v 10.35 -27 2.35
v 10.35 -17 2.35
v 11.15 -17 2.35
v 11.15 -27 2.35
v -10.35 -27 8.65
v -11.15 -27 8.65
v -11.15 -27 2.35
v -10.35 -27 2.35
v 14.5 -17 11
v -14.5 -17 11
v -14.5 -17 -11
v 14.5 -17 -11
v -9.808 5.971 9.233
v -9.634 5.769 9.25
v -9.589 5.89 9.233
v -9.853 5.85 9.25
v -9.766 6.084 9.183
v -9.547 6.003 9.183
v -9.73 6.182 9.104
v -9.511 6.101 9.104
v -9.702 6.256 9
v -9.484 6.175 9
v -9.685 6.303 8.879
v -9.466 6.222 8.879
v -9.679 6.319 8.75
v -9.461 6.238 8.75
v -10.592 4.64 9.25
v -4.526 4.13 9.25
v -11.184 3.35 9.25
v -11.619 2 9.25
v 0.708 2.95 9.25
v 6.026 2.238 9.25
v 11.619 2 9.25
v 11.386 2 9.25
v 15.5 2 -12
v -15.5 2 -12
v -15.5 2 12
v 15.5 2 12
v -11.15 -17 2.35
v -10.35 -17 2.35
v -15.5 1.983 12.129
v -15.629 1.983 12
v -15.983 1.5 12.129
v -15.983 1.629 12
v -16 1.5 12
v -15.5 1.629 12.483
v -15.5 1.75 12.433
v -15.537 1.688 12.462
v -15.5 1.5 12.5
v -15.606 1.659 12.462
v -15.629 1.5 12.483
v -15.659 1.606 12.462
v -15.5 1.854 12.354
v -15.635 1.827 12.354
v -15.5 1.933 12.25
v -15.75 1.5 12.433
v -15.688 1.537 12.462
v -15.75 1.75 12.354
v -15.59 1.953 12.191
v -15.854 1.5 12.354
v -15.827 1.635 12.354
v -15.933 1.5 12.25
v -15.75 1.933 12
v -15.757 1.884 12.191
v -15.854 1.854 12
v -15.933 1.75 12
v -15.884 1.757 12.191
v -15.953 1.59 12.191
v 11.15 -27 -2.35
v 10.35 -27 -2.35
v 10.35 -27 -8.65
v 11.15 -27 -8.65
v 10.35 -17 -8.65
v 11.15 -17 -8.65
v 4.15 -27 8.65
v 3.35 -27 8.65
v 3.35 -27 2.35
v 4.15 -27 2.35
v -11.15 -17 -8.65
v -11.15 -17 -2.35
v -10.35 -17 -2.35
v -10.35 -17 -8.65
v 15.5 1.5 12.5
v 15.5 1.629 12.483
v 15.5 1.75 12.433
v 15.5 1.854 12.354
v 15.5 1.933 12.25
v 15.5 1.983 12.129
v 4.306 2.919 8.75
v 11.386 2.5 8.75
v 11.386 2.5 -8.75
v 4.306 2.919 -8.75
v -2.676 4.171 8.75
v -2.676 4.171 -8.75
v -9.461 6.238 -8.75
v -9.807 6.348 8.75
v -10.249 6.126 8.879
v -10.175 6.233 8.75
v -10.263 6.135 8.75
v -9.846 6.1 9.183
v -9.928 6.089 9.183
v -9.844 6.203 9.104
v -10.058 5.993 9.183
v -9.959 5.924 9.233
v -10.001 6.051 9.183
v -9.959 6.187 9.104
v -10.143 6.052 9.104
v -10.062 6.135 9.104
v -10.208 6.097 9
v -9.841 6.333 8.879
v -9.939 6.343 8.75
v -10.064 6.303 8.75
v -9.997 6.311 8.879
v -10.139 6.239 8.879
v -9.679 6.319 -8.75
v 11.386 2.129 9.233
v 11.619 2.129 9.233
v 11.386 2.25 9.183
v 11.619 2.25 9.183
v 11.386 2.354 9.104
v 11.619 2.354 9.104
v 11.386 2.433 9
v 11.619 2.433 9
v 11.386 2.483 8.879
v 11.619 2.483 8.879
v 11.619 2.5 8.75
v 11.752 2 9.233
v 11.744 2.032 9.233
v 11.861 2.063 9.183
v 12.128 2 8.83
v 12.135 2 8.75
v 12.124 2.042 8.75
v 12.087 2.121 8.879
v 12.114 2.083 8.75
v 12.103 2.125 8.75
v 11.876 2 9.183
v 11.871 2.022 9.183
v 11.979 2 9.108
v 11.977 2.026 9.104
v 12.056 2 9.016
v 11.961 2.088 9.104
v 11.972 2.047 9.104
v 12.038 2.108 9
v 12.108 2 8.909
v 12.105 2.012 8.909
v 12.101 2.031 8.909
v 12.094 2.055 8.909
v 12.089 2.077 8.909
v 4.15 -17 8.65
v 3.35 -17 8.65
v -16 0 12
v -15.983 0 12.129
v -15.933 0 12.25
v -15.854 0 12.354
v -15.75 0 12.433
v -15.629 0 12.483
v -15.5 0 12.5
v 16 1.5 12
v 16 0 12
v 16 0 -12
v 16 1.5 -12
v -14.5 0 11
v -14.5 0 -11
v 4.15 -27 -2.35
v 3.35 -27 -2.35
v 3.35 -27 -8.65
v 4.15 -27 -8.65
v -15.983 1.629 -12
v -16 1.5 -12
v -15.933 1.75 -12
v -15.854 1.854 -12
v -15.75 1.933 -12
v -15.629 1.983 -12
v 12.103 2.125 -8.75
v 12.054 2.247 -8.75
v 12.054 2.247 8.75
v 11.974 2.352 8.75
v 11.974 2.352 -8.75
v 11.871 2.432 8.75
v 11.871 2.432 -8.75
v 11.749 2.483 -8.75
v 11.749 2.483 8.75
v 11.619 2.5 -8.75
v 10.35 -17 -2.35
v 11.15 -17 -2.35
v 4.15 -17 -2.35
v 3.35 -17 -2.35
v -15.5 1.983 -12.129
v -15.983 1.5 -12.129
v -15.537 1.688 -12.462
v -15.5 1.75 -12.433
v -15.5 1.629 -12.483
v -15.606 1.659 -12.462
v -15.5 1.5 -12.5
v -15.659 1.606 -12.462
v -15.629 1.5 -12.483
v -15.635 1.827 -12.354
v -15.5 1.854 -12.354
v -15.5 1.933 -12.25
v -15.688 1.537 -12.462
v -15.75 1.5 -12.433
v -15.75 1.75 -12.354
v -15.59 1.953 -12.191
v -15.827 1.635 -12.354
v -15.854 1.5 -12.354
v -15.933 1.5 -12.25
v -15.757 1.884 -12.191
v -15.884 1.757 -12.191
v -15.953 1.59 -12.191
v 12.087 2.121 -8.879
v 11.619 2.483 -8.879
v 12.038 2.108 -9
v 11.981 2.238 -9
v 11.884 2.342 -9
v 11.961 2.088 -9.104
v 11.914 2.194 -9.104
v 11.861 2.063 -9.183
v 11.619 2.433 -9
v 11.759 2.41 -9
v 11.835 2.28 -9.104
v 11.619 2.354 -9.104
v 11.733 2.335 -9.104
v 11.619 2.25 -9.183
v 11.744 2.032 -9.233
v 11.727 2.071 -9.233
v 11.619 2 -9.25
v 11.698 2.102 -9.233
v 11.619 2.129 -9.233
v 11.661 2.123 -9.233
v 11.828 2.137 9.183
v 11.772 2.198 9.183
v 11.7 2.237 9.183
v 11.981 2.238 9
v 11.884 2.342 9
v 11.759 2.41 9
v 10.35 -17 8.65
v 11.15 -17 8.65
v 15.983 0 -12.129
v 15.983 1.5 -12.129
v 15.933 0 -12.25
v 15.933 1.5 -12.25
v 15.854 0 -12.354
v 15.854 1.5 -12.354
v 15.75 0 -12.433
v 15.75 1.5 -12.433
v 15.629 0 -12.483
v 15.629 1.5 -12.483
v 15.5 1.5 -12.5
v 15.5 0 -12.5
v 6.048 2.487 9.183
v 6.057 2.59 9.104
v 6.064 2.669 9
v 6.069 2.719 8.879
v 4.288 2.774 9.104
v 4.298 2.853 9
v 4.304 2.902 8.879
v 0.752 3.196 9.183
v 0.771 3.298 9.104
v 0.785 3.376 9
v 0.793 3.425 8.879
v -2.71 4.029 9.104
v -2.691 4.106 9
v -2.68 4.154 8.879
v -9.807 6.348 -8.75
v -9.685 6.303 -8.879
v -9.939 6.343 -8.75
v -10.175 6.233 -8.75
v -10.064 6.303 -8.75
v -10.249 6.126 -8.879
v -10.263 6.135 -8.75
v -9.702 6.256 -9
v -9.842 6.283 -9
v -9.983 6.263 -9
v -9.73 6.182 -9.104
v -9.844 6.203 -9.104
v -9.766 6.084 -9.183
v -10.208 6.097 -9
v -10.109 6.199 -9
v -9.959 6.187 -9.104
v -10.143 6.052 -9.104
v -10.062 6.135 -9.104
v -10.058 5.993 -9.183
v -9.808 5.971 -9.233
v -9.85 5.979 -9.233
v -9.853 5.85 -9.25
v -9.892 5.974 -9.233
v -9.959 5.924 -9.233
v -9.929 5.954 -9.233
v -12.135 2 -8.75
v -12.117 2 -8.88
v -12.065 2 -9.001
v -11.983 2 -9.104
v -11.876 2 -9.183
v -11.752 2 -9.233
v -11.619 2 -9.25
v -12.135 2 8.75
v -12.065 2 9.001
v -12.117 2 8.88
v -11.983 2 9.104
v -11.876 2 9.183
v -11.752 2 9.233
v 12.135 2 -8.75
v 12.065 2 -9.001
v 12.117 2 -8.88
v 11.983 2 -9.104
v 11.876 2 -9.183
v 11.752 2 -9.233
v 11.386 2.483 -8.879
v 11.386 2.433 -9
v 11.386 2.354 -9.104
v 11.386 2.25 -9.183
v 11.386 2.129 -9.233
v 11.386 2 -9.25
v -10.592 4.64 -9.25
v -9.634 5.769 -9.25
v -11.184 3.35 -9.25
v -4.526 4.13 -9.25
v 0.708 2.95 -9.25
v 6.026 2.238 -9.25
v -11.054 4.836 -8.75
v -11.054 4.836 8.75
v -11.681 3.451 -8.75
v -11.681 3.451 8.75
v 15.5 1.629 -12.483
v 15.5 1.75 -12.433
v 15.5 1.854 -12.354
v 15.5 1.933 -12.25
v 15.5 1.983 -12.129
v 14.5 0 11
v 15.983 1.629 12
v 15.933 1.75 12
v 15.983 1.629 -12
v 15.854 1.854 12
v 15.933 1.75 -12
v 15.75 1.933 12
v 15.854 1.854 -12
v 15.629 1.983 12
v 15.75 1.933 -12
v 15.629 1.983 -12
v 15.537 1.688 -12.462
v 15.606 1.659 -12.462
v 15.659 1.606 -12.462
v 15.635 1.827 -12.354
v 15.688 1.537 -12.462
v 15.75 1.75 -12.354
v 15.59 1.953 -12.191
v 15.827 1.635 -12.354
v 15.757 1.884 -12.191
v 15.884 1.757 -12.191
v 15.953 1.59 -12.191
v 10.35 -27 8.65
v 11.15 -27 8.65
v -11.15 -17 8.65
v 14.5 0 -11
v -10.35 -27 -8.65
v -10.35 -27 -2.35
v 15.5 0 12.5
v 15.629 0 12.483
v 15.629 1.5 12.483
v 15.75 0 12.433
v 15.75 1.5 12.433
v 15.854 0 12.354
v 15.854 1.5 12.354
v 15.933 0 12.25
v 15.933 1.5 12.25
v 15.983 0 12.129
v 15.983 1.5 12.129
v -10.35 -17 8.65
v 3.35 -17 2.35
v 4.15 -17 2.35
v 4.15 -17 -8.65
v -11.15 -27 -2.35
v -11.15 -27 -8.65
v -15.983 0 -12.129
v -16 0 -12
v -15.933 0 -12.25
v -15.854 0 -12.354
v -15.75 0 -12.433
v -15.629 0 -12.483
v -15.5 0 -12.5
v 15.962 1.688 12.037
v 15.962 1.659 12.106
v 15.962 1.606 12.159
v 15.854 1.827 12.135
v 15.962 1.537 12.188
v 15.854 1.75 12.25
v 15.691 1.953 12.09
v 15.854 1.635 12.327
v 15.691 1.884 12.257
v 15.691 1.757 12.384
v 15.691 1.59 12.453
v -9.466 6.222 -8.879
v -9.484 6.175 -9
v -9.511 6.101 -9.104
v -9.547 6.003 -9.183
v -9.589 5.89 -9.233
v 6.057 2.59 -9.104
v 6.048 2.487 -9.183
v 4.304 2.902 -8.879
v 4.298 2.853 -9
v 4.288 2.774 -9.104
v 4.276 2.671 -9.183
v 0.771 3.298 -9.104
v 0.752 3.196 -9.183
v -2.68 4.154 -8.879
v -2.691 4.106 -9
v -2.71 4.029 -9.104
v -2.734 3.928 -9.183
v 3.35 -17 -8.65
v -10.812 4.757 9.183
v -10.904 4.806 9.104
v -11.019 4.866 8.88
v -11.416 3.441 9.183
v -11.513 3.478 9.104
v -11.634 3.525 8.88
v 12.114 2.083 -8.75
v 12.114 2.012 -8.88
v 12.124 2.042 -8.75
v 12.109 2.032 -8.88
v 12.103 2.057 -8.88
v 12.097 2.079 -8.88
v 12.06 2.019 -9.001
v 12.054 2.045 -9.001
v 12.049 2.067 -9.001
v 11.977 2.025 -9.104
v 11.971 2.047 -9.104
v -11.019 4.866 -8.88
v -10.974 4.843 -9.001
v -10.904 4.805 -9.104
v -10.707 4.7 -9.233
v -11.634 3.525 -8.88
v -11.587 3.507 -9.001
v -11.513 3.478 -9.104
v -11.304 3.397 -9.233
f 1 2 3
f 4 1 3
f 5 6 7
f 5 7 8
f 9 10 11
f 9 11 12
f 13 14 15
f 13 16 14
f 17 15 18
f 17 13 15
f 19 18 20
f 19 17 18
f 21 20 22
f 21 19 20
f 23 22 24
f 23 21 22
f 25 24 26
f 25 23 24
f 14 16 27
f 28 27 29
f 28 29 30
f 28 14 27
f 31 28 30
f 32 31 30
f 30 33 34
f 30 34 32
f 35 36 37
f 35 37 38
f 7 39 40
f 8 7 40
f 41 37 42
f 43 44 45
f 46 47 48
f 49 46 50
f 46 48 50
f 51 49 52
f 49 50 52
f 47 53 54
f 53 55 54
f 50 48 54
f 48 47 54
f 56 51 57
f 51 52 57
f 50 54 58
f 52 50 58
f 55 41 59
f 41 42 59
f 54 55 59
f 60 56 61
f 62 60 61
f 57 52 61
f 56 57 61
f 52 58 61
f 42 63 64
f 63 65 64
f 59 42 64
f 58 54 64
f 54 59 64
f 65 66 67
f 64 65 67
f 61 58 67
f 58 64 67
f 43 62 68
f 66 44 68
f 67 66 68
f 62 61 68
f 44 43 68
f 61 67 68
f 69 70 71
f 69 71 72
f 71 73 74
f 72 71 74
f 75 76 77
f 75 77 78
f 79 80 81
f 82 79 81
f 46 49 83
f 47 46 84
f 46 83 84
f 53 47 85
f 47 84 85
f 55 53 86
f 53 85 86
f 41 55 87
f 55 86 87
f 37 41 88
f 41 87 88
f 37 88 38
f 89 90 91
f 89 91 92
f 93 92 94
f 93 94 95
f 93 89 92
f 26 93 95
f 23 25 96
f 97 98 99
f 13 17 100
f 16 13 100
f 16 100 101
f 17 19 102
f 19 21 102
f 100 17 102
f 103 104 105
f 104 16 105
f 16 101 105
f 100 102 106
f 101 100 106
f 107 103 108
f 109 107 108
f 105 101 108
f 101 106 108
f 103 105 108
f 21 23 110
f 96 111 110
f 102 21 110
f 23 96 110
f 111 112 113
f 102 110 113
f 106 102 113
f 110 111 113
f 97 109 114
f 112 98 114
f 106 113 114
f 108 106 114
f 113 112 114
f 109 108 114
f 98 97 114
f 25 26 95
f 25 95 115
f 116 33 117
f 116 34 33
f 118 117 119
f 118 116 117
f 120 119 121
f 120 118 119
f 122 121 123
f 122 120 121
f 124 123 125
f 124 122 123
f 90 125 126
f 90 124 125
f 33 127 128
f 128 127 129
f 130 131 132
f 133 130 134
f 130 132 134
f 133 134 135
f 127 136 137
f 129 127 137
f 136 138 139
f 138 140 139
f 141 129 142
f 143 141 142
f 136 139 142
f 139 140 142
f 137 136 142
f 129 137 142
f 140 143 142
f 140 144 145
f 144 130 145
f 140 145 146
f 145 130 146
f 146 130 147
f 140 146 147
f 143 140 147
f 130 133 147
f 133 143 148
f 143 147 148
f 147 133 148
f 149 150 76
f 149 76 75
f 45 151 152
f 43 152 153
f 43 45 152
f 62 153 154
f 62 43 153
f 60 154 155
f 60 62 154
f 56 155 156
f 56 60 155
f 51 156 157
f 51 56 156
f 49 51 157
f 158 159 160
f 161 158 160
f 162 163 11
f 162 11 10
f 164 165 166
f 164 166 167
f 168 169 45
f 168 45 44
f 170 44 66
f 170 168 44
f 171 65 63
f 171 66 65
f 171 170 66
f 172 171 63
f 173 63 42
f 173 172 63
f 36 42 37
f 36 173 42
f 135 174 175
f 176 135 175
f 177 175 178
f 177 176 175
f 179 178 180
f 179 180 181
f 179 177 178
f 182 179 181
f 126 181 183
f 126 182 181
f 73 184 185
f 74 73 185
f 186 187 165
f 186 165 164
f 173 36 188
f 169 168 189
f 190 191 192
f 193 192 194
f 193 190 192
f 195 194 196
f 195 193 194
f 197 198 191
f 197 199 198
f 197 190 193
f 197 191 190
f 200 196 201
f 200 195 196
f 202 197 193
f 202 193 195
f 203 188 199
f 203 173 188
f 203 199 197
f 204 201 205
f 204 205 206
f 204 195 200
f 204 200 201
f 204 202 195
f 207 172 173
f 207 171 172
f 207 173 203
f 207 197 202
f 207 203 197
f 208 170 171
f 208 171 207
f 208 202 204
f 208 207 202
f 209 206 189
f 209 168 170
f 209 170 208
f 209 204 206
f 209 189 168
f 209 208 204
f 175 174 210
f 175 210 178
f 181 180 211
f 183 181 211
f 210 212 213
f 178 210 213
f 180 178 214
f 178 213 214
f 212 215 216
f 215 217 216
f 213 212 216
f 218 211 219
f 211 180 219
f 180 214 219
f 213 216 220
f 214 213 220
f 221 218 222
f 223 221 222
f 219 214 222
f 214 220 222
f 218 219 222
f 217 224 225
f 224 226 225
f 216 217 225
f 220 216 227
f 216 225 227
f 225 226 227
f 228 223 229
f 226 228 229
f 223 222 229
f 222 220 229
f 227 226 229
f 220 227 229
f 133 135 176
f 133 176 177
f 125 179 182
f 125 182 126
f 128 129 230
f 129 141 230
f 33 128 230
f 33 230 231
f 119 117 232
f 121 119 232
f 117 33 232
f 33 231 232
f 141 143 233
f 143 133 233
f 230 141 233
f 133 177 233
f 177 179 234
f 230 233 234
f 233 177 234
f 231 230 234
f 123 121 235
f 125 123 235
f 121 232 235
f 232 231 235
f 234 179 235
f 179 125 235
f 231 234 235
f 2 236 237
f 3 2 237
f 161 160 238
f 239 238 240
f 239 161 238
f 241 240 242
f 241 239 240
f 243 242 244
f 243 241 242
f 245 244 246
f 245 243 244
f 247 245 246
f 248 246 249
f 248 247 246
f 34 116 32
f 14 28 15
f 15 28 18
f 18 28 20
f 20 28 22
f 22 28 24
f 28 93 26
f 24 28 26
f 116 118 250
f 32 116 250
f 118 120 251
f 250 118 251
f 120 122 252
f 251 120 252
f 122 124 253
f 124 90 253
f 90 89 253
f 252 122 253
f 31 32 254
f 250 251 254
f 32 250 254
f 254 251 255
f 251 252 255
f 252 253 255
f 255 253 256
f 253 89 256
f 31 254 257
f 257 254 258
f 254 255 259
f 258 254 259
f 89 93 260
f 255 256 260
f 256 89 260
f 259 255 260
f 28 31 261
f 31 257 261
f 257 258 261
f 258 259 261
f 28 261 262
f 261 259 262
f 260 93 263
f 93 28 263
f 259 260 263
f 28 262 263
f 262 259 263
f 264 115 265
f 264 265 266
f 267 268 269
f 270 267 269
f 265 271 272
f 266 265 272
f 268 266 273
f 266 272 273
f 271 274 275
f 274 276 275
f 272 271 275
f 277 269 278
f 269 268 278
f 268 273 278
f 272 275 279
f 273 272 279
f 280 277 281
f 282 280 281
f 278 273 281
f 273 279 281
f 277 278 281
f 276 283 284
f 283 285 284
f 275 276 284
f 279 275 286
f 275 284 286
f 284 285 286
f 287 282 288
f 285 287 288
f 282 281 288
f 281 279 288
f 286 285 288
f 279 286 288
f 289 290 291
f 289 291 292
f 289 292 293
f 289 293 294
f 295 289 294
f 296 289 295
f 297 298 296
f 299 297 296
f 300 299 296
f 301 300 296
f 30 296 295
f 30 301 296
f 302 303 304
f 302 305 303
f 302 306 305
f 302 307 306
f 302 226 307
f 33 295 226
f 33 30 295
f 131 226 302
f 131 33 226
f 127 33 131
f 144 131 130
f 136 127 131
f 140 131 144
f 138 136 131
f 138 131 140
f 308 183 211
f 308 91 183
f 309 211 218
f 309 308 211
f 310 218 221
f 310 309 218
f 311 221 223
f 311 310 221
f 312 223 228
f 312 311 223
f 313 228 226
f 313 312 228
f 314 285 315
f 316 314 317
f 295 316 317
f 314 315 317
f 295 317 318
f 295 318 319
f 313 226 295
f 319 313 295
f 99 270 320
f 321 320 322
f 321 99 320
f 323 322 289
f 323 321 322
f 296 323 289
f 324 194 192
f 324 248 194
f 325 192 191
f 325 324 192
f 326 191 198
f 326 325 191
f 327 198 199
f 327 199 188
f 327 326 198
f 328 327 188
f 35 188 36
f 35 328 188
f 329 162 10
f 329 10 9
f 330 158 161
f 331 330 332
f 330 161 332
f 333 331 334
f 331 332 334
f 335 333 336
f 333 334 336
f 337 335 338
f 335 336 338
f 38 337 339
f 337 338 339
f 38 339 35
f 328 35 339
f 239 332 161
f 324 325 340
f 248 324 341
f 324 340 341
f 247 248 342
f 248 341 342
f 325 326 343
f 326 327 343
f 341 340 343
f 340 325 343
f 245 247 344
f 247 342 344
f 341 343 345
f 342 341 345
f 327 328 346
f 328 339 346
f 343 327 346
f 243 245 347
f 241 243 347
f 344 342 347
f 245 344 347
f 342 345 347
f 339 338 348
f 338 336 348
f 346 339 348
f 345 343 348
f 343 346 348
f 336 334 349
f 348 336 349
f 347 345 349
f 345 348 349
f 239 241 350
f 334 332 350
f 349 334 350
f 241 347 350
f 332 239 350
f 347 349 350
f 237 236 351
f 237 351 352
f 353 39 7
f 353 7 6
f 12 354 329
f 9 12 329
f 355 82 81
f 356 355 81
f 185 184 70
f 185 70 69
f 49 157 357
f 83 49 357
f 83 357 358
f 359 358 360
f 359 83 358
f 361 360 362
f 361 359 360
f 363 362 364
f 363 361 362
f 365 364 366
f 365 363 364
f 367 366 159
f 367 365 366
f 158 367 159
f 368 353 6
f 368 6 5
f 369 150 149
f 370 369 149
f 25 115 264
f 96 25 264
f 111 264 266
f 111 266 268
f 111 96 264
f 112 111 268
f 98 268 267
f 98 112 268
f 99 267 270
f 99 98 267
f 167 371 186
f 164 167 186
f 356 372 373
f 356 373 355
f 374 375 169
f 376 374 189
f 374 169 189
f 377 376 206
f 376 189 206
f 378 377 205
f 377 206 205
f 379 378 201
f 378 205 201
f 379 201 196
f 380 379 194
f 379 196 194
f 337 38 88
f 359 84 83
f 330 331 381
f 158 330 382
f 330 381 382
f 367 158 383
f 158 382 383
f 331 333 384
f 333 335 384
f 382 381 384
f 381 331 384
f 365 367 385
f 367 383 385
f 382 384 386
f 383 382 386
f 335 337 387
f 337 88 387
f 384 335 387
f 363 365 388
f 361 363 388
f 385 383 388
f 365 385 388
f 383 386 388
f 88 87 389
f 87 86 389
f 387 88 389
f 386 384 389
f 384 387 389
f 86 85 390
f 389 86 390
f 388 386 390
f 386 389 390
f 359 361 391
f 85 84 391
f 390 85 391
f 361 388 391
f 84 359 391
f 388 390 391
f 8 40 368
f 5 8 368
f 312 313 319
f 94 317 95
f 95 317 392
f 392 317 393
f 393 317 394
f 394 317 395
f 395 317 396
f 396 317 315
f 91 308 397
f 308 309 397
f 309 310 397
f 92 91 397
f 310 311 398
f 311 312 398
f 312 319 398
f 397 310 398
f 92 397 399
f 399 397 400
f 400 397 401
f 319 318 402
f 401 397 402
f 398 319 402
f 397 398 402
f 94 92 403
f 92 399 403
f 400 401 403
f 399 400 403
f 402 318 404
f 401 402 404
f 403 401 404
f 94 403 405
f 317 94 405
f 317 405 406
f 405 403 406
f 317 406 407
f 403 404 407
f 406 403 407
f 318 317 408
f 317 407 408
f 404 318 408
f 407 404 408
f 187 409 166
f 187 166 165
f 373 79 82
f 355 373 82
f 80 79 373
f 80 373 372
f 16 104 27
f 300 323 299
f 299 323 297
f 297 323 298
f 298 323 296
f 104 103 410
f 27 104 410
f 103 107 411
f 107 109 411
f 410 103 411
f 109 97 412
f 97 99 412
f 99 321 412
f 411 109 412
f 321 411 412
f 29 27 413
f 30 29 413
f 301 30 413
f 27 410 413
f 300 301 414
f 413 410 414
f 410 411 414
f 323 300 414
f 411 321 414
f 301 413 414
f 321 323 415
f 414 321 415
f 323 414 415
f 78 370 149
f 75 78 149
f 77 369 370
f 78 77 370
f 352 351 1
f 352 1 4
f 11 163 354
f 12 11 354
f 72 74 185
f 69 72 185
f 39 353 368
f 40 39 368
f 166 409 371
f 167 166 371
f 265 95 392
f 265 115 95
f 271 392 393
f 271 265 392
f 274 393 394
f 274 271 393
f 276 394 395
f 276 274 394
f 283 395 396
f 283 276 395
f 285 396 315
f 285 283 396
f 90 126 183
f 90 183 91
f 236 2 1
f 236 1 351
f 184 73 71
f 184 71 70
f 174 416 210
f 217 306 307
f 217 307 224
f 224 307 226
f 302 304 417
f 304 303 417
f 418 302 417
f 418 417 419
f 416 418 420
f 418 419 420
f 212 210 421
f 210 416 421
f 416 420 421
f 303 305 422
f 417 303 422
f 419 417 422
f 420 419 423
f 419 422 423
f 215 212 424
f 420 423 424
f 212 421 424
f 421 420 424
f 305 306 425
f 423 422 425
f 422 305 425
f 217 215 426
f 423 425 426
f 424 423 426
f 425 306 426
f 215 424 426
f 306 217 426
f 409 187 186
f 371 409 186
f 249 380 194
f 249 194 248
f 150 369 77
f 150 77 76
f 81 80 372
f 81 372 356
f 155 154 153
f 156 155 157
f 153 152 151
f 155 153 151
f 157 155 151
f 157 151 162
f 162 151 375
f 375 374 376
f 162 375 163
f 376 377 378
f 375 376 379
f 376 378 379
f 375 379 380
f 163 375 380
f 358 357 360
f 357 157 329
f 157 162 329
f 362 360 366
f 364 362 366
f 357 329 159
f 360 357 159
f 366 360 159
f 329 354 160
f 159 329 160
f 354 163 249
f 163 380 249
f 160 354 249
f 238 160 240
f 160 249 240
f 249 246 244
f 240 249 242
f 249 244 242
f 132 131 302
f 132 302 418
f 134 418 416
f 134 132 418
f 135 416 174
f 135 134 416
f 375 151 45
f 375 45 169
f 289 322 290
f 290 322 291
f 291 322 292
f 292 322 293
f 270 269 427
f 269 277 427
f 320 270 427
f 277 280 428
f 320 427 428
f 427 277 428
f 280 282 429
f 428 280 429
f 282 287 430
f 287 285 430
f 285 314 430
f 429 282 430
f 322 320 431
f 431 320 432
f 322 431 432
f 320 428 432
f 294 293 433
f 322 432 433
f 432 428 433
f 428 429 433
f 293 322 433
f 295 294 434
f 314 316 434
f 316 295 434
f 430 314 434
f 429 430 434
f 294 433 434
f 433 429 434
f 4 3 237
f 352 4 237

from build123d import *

# Parameters (mm, degrees)
ESQUISSE1_W          = 32
ESQUISSE1_H          = 25
BOSS_EXTRU_1_DEPTH   = 2
CONG_1_R             = 0.5
ESQUISSE2_W          = 29
ESQUISSE2_H          = 22
BOSS_EXTRU_2_DEPTH   = 17
ESQUISSE3_W          = 0.8
ESQUISSE3_H          = 6.3
BOSS_EXTRU_3_DEPTH   = 10
BOSS_EXTRU_3_2_DEPTH = 10
BOSS_EXTRU_3_3_DEPTH = 10
BOSS_EXTRU_3_4_DEPTH = 10
BOSS_EXTRU_3_5_DEPTH = 10
BOSS_EXTRU_3_6_DEPTH = 10
BOSS_EXTRU_4_DEPTH   = 9.25
CONG_2_R             = 0.5


with BuildPart() as part:
    # Esquisse1 → Boss.-Extru.1 (new body)
    with BuildSketch(Plane(origin=(0, 0, 0), x_dir=(1, 0, 0), z_dir=(0, 1, 0))):
        Rectangle(ESQUISSE1_W, ESQUISSE1_H)
    extrude(amount=BOSS_EXTRU_1_DEPTH)

    # Congé1
    cong_1_edges = [part.edges().sort_by_distance(p)[0] for p in [
        (-16, 2, 0),
        (0, 2, 12.5),
        (16, 2, 0),
        (0, 2, -12.5),
        (16, 1, 12.5),
        (-16, 1, 12.5),
        (-16, 1, -12.5),
        (16, 1, -12.5),
    ]]
    fillet(cong_1_edges, radius=CONG_1_R)

    # Esquisse2 → Boss.-Extru.2 (add)
    with BuildSketch(Plane.XZ):
        Rectangle(ESQUISSE2_W, ESQUISSE2_H)
    extrude(amount=BOSS_EXTRU_2_DEPTH)


with BuildPart() as body_2:
    # Esquisse3 → Boss.-Extru.3 (new body)
    with BuildSketch(Plane.XZ.offset(17)):
        with Locations((-10.75, 5.5)):
            Rectangle(ESQUISSE3_W, ESQUISSE3_H)
    extrude(amount=BOSS_EXTRU_3_DEPTH)


with BuildPart() as body_3:
    # Esquisse3 → Boss.-Extru.3 2 (new body)
    with BuildSketch(Plane.XZ.offset(17)):
        with Locations((10.75, 5.5)):
            Rectangle(ESQUISSE3_W, ESQUISSE3_H)
    extrude(amount=BOSS_EXTRU_3_2_DEPTH)


with BuildPart() as body_4:
    # Esquisse3 → Boss.-Extru.3 3 (new body)
    with BuildSketch(Plane.XZ.offset(17)):
        with Locations((3.75, 5.5)):
            Rectangle(ESQUISSE3_W, ESQUISSE3_H)
    extrude(amount=BOSS_EXTRU_3_3_DEPTH)


with BuildPart() as body_5:
    # Esquisse3 → Boss.-Extru.3 4 (new body)
    with BuildSketch(Plane.XZ.offset(17)):
        with Locations((3.75, -5.5)):
            Rectangle(ESQUISSE3_W, ESQUISSE3_H)
    extrude(amount=BOSS_EXTRU_3_4_DEPTH)


with BuildPart() as body_6:
    # Esquisse3 → Boss.-Extru.3 5 (new body)
    with BuildSketch(Plane.XZ.offset(17)):
        with Locations((10.75, -5.5)):
            Rectangle(ESQUISSE3_W, ESQUISSE3_H)
    extrude(amount=BOSS_EXTRU_3_5_DEPTH)


with BuildPart() as body_7:
    # Esquisse3 → Boss.-Extru.3 6 (new body)
    with BuildSketch(Plane.XZ.offset(17)):
        with Locations((-10.75, -5.5)):
            Rectangle(ESQUISSE3_W, ESQUISSE3_H)
    extrude(amount=BOSS_EXTRU_3_6_DEPTH)


with BuildPart() as body_8:
    # Esquisse4 → Boss.-Extru.4 (new, symmetric)
    with BuildSketch(Plane.XY):
        with BuildLine():
            Line((-12.1346611, 2), (12.1346611, 2))
            ThreePointArc((12.1346611, 2), (12.119028191, 2.062540727), (12.103072957, 2.125))
            ThreePointArc((12.103072957, 2.125), (11.925136256, 2.395284708), (11.618950039, 2.5))
            Line((11.618950039, 2.5), (11.38589526, 2.5))
            ThreePointArc((11.38589526, 2.5), (0.796450029, 3.441862121), (-9.460535289, 6.237878343))
            Line((-9.460535289, 6.237878343), (-9.679071228, 6.318851014))
            ThreePointArc((-9.679071228, 6.318851014), (-10.002565, 6.327040767), (-10.263324461, 6.135416667))
            ThreePointArc((-10.263324461, 6.135416667), (-11.388277176, 4.153362296), (-12.1346611, 2))
        make_face()
    extrude(amount=BOSS_EXTRU_4_DEPTH, both=True)

    # Congé2
    cong_2_edges = [body_8.edges().sort_by_distance(p)[0] for p in [
        (12.119028191, 2.062540727, 9.25),
        (-11.388277176, 4.153362296, -9.25),
        (11.925136256, 2.395284708, 9.25),
        (11.502422649, 2.5, 9.25),
        (0.796450029, 3.441862121, 9.25),
        (-9.569803259, 6.278364678, 9.25),
        (-10.002565, 6.327040767, 9.25),
        (-11.388277176, 4.153362296, 9.25),
        (-10.002565, 6.327040767, -9.25),
        (-9.569803259, 6.278364678, -9.25),
        (0.796450029, 3.441862121, -9.25),
        (11.502422649, 2.5, -9.25),
        (11.925136256, 2.395284708, -9.25),
        (12.119028191, 2.062540727, -9.25),
    ]]
    fillet(cong_2_edges, radius=CONG_2_R - 0.0001)  # a hair under: the kernel refuses the full size


solid = Compound([part.part, body_2.part, body_3.part, body_4.part, body_5.part, body_6.part, body_7.part, body_8.part])
